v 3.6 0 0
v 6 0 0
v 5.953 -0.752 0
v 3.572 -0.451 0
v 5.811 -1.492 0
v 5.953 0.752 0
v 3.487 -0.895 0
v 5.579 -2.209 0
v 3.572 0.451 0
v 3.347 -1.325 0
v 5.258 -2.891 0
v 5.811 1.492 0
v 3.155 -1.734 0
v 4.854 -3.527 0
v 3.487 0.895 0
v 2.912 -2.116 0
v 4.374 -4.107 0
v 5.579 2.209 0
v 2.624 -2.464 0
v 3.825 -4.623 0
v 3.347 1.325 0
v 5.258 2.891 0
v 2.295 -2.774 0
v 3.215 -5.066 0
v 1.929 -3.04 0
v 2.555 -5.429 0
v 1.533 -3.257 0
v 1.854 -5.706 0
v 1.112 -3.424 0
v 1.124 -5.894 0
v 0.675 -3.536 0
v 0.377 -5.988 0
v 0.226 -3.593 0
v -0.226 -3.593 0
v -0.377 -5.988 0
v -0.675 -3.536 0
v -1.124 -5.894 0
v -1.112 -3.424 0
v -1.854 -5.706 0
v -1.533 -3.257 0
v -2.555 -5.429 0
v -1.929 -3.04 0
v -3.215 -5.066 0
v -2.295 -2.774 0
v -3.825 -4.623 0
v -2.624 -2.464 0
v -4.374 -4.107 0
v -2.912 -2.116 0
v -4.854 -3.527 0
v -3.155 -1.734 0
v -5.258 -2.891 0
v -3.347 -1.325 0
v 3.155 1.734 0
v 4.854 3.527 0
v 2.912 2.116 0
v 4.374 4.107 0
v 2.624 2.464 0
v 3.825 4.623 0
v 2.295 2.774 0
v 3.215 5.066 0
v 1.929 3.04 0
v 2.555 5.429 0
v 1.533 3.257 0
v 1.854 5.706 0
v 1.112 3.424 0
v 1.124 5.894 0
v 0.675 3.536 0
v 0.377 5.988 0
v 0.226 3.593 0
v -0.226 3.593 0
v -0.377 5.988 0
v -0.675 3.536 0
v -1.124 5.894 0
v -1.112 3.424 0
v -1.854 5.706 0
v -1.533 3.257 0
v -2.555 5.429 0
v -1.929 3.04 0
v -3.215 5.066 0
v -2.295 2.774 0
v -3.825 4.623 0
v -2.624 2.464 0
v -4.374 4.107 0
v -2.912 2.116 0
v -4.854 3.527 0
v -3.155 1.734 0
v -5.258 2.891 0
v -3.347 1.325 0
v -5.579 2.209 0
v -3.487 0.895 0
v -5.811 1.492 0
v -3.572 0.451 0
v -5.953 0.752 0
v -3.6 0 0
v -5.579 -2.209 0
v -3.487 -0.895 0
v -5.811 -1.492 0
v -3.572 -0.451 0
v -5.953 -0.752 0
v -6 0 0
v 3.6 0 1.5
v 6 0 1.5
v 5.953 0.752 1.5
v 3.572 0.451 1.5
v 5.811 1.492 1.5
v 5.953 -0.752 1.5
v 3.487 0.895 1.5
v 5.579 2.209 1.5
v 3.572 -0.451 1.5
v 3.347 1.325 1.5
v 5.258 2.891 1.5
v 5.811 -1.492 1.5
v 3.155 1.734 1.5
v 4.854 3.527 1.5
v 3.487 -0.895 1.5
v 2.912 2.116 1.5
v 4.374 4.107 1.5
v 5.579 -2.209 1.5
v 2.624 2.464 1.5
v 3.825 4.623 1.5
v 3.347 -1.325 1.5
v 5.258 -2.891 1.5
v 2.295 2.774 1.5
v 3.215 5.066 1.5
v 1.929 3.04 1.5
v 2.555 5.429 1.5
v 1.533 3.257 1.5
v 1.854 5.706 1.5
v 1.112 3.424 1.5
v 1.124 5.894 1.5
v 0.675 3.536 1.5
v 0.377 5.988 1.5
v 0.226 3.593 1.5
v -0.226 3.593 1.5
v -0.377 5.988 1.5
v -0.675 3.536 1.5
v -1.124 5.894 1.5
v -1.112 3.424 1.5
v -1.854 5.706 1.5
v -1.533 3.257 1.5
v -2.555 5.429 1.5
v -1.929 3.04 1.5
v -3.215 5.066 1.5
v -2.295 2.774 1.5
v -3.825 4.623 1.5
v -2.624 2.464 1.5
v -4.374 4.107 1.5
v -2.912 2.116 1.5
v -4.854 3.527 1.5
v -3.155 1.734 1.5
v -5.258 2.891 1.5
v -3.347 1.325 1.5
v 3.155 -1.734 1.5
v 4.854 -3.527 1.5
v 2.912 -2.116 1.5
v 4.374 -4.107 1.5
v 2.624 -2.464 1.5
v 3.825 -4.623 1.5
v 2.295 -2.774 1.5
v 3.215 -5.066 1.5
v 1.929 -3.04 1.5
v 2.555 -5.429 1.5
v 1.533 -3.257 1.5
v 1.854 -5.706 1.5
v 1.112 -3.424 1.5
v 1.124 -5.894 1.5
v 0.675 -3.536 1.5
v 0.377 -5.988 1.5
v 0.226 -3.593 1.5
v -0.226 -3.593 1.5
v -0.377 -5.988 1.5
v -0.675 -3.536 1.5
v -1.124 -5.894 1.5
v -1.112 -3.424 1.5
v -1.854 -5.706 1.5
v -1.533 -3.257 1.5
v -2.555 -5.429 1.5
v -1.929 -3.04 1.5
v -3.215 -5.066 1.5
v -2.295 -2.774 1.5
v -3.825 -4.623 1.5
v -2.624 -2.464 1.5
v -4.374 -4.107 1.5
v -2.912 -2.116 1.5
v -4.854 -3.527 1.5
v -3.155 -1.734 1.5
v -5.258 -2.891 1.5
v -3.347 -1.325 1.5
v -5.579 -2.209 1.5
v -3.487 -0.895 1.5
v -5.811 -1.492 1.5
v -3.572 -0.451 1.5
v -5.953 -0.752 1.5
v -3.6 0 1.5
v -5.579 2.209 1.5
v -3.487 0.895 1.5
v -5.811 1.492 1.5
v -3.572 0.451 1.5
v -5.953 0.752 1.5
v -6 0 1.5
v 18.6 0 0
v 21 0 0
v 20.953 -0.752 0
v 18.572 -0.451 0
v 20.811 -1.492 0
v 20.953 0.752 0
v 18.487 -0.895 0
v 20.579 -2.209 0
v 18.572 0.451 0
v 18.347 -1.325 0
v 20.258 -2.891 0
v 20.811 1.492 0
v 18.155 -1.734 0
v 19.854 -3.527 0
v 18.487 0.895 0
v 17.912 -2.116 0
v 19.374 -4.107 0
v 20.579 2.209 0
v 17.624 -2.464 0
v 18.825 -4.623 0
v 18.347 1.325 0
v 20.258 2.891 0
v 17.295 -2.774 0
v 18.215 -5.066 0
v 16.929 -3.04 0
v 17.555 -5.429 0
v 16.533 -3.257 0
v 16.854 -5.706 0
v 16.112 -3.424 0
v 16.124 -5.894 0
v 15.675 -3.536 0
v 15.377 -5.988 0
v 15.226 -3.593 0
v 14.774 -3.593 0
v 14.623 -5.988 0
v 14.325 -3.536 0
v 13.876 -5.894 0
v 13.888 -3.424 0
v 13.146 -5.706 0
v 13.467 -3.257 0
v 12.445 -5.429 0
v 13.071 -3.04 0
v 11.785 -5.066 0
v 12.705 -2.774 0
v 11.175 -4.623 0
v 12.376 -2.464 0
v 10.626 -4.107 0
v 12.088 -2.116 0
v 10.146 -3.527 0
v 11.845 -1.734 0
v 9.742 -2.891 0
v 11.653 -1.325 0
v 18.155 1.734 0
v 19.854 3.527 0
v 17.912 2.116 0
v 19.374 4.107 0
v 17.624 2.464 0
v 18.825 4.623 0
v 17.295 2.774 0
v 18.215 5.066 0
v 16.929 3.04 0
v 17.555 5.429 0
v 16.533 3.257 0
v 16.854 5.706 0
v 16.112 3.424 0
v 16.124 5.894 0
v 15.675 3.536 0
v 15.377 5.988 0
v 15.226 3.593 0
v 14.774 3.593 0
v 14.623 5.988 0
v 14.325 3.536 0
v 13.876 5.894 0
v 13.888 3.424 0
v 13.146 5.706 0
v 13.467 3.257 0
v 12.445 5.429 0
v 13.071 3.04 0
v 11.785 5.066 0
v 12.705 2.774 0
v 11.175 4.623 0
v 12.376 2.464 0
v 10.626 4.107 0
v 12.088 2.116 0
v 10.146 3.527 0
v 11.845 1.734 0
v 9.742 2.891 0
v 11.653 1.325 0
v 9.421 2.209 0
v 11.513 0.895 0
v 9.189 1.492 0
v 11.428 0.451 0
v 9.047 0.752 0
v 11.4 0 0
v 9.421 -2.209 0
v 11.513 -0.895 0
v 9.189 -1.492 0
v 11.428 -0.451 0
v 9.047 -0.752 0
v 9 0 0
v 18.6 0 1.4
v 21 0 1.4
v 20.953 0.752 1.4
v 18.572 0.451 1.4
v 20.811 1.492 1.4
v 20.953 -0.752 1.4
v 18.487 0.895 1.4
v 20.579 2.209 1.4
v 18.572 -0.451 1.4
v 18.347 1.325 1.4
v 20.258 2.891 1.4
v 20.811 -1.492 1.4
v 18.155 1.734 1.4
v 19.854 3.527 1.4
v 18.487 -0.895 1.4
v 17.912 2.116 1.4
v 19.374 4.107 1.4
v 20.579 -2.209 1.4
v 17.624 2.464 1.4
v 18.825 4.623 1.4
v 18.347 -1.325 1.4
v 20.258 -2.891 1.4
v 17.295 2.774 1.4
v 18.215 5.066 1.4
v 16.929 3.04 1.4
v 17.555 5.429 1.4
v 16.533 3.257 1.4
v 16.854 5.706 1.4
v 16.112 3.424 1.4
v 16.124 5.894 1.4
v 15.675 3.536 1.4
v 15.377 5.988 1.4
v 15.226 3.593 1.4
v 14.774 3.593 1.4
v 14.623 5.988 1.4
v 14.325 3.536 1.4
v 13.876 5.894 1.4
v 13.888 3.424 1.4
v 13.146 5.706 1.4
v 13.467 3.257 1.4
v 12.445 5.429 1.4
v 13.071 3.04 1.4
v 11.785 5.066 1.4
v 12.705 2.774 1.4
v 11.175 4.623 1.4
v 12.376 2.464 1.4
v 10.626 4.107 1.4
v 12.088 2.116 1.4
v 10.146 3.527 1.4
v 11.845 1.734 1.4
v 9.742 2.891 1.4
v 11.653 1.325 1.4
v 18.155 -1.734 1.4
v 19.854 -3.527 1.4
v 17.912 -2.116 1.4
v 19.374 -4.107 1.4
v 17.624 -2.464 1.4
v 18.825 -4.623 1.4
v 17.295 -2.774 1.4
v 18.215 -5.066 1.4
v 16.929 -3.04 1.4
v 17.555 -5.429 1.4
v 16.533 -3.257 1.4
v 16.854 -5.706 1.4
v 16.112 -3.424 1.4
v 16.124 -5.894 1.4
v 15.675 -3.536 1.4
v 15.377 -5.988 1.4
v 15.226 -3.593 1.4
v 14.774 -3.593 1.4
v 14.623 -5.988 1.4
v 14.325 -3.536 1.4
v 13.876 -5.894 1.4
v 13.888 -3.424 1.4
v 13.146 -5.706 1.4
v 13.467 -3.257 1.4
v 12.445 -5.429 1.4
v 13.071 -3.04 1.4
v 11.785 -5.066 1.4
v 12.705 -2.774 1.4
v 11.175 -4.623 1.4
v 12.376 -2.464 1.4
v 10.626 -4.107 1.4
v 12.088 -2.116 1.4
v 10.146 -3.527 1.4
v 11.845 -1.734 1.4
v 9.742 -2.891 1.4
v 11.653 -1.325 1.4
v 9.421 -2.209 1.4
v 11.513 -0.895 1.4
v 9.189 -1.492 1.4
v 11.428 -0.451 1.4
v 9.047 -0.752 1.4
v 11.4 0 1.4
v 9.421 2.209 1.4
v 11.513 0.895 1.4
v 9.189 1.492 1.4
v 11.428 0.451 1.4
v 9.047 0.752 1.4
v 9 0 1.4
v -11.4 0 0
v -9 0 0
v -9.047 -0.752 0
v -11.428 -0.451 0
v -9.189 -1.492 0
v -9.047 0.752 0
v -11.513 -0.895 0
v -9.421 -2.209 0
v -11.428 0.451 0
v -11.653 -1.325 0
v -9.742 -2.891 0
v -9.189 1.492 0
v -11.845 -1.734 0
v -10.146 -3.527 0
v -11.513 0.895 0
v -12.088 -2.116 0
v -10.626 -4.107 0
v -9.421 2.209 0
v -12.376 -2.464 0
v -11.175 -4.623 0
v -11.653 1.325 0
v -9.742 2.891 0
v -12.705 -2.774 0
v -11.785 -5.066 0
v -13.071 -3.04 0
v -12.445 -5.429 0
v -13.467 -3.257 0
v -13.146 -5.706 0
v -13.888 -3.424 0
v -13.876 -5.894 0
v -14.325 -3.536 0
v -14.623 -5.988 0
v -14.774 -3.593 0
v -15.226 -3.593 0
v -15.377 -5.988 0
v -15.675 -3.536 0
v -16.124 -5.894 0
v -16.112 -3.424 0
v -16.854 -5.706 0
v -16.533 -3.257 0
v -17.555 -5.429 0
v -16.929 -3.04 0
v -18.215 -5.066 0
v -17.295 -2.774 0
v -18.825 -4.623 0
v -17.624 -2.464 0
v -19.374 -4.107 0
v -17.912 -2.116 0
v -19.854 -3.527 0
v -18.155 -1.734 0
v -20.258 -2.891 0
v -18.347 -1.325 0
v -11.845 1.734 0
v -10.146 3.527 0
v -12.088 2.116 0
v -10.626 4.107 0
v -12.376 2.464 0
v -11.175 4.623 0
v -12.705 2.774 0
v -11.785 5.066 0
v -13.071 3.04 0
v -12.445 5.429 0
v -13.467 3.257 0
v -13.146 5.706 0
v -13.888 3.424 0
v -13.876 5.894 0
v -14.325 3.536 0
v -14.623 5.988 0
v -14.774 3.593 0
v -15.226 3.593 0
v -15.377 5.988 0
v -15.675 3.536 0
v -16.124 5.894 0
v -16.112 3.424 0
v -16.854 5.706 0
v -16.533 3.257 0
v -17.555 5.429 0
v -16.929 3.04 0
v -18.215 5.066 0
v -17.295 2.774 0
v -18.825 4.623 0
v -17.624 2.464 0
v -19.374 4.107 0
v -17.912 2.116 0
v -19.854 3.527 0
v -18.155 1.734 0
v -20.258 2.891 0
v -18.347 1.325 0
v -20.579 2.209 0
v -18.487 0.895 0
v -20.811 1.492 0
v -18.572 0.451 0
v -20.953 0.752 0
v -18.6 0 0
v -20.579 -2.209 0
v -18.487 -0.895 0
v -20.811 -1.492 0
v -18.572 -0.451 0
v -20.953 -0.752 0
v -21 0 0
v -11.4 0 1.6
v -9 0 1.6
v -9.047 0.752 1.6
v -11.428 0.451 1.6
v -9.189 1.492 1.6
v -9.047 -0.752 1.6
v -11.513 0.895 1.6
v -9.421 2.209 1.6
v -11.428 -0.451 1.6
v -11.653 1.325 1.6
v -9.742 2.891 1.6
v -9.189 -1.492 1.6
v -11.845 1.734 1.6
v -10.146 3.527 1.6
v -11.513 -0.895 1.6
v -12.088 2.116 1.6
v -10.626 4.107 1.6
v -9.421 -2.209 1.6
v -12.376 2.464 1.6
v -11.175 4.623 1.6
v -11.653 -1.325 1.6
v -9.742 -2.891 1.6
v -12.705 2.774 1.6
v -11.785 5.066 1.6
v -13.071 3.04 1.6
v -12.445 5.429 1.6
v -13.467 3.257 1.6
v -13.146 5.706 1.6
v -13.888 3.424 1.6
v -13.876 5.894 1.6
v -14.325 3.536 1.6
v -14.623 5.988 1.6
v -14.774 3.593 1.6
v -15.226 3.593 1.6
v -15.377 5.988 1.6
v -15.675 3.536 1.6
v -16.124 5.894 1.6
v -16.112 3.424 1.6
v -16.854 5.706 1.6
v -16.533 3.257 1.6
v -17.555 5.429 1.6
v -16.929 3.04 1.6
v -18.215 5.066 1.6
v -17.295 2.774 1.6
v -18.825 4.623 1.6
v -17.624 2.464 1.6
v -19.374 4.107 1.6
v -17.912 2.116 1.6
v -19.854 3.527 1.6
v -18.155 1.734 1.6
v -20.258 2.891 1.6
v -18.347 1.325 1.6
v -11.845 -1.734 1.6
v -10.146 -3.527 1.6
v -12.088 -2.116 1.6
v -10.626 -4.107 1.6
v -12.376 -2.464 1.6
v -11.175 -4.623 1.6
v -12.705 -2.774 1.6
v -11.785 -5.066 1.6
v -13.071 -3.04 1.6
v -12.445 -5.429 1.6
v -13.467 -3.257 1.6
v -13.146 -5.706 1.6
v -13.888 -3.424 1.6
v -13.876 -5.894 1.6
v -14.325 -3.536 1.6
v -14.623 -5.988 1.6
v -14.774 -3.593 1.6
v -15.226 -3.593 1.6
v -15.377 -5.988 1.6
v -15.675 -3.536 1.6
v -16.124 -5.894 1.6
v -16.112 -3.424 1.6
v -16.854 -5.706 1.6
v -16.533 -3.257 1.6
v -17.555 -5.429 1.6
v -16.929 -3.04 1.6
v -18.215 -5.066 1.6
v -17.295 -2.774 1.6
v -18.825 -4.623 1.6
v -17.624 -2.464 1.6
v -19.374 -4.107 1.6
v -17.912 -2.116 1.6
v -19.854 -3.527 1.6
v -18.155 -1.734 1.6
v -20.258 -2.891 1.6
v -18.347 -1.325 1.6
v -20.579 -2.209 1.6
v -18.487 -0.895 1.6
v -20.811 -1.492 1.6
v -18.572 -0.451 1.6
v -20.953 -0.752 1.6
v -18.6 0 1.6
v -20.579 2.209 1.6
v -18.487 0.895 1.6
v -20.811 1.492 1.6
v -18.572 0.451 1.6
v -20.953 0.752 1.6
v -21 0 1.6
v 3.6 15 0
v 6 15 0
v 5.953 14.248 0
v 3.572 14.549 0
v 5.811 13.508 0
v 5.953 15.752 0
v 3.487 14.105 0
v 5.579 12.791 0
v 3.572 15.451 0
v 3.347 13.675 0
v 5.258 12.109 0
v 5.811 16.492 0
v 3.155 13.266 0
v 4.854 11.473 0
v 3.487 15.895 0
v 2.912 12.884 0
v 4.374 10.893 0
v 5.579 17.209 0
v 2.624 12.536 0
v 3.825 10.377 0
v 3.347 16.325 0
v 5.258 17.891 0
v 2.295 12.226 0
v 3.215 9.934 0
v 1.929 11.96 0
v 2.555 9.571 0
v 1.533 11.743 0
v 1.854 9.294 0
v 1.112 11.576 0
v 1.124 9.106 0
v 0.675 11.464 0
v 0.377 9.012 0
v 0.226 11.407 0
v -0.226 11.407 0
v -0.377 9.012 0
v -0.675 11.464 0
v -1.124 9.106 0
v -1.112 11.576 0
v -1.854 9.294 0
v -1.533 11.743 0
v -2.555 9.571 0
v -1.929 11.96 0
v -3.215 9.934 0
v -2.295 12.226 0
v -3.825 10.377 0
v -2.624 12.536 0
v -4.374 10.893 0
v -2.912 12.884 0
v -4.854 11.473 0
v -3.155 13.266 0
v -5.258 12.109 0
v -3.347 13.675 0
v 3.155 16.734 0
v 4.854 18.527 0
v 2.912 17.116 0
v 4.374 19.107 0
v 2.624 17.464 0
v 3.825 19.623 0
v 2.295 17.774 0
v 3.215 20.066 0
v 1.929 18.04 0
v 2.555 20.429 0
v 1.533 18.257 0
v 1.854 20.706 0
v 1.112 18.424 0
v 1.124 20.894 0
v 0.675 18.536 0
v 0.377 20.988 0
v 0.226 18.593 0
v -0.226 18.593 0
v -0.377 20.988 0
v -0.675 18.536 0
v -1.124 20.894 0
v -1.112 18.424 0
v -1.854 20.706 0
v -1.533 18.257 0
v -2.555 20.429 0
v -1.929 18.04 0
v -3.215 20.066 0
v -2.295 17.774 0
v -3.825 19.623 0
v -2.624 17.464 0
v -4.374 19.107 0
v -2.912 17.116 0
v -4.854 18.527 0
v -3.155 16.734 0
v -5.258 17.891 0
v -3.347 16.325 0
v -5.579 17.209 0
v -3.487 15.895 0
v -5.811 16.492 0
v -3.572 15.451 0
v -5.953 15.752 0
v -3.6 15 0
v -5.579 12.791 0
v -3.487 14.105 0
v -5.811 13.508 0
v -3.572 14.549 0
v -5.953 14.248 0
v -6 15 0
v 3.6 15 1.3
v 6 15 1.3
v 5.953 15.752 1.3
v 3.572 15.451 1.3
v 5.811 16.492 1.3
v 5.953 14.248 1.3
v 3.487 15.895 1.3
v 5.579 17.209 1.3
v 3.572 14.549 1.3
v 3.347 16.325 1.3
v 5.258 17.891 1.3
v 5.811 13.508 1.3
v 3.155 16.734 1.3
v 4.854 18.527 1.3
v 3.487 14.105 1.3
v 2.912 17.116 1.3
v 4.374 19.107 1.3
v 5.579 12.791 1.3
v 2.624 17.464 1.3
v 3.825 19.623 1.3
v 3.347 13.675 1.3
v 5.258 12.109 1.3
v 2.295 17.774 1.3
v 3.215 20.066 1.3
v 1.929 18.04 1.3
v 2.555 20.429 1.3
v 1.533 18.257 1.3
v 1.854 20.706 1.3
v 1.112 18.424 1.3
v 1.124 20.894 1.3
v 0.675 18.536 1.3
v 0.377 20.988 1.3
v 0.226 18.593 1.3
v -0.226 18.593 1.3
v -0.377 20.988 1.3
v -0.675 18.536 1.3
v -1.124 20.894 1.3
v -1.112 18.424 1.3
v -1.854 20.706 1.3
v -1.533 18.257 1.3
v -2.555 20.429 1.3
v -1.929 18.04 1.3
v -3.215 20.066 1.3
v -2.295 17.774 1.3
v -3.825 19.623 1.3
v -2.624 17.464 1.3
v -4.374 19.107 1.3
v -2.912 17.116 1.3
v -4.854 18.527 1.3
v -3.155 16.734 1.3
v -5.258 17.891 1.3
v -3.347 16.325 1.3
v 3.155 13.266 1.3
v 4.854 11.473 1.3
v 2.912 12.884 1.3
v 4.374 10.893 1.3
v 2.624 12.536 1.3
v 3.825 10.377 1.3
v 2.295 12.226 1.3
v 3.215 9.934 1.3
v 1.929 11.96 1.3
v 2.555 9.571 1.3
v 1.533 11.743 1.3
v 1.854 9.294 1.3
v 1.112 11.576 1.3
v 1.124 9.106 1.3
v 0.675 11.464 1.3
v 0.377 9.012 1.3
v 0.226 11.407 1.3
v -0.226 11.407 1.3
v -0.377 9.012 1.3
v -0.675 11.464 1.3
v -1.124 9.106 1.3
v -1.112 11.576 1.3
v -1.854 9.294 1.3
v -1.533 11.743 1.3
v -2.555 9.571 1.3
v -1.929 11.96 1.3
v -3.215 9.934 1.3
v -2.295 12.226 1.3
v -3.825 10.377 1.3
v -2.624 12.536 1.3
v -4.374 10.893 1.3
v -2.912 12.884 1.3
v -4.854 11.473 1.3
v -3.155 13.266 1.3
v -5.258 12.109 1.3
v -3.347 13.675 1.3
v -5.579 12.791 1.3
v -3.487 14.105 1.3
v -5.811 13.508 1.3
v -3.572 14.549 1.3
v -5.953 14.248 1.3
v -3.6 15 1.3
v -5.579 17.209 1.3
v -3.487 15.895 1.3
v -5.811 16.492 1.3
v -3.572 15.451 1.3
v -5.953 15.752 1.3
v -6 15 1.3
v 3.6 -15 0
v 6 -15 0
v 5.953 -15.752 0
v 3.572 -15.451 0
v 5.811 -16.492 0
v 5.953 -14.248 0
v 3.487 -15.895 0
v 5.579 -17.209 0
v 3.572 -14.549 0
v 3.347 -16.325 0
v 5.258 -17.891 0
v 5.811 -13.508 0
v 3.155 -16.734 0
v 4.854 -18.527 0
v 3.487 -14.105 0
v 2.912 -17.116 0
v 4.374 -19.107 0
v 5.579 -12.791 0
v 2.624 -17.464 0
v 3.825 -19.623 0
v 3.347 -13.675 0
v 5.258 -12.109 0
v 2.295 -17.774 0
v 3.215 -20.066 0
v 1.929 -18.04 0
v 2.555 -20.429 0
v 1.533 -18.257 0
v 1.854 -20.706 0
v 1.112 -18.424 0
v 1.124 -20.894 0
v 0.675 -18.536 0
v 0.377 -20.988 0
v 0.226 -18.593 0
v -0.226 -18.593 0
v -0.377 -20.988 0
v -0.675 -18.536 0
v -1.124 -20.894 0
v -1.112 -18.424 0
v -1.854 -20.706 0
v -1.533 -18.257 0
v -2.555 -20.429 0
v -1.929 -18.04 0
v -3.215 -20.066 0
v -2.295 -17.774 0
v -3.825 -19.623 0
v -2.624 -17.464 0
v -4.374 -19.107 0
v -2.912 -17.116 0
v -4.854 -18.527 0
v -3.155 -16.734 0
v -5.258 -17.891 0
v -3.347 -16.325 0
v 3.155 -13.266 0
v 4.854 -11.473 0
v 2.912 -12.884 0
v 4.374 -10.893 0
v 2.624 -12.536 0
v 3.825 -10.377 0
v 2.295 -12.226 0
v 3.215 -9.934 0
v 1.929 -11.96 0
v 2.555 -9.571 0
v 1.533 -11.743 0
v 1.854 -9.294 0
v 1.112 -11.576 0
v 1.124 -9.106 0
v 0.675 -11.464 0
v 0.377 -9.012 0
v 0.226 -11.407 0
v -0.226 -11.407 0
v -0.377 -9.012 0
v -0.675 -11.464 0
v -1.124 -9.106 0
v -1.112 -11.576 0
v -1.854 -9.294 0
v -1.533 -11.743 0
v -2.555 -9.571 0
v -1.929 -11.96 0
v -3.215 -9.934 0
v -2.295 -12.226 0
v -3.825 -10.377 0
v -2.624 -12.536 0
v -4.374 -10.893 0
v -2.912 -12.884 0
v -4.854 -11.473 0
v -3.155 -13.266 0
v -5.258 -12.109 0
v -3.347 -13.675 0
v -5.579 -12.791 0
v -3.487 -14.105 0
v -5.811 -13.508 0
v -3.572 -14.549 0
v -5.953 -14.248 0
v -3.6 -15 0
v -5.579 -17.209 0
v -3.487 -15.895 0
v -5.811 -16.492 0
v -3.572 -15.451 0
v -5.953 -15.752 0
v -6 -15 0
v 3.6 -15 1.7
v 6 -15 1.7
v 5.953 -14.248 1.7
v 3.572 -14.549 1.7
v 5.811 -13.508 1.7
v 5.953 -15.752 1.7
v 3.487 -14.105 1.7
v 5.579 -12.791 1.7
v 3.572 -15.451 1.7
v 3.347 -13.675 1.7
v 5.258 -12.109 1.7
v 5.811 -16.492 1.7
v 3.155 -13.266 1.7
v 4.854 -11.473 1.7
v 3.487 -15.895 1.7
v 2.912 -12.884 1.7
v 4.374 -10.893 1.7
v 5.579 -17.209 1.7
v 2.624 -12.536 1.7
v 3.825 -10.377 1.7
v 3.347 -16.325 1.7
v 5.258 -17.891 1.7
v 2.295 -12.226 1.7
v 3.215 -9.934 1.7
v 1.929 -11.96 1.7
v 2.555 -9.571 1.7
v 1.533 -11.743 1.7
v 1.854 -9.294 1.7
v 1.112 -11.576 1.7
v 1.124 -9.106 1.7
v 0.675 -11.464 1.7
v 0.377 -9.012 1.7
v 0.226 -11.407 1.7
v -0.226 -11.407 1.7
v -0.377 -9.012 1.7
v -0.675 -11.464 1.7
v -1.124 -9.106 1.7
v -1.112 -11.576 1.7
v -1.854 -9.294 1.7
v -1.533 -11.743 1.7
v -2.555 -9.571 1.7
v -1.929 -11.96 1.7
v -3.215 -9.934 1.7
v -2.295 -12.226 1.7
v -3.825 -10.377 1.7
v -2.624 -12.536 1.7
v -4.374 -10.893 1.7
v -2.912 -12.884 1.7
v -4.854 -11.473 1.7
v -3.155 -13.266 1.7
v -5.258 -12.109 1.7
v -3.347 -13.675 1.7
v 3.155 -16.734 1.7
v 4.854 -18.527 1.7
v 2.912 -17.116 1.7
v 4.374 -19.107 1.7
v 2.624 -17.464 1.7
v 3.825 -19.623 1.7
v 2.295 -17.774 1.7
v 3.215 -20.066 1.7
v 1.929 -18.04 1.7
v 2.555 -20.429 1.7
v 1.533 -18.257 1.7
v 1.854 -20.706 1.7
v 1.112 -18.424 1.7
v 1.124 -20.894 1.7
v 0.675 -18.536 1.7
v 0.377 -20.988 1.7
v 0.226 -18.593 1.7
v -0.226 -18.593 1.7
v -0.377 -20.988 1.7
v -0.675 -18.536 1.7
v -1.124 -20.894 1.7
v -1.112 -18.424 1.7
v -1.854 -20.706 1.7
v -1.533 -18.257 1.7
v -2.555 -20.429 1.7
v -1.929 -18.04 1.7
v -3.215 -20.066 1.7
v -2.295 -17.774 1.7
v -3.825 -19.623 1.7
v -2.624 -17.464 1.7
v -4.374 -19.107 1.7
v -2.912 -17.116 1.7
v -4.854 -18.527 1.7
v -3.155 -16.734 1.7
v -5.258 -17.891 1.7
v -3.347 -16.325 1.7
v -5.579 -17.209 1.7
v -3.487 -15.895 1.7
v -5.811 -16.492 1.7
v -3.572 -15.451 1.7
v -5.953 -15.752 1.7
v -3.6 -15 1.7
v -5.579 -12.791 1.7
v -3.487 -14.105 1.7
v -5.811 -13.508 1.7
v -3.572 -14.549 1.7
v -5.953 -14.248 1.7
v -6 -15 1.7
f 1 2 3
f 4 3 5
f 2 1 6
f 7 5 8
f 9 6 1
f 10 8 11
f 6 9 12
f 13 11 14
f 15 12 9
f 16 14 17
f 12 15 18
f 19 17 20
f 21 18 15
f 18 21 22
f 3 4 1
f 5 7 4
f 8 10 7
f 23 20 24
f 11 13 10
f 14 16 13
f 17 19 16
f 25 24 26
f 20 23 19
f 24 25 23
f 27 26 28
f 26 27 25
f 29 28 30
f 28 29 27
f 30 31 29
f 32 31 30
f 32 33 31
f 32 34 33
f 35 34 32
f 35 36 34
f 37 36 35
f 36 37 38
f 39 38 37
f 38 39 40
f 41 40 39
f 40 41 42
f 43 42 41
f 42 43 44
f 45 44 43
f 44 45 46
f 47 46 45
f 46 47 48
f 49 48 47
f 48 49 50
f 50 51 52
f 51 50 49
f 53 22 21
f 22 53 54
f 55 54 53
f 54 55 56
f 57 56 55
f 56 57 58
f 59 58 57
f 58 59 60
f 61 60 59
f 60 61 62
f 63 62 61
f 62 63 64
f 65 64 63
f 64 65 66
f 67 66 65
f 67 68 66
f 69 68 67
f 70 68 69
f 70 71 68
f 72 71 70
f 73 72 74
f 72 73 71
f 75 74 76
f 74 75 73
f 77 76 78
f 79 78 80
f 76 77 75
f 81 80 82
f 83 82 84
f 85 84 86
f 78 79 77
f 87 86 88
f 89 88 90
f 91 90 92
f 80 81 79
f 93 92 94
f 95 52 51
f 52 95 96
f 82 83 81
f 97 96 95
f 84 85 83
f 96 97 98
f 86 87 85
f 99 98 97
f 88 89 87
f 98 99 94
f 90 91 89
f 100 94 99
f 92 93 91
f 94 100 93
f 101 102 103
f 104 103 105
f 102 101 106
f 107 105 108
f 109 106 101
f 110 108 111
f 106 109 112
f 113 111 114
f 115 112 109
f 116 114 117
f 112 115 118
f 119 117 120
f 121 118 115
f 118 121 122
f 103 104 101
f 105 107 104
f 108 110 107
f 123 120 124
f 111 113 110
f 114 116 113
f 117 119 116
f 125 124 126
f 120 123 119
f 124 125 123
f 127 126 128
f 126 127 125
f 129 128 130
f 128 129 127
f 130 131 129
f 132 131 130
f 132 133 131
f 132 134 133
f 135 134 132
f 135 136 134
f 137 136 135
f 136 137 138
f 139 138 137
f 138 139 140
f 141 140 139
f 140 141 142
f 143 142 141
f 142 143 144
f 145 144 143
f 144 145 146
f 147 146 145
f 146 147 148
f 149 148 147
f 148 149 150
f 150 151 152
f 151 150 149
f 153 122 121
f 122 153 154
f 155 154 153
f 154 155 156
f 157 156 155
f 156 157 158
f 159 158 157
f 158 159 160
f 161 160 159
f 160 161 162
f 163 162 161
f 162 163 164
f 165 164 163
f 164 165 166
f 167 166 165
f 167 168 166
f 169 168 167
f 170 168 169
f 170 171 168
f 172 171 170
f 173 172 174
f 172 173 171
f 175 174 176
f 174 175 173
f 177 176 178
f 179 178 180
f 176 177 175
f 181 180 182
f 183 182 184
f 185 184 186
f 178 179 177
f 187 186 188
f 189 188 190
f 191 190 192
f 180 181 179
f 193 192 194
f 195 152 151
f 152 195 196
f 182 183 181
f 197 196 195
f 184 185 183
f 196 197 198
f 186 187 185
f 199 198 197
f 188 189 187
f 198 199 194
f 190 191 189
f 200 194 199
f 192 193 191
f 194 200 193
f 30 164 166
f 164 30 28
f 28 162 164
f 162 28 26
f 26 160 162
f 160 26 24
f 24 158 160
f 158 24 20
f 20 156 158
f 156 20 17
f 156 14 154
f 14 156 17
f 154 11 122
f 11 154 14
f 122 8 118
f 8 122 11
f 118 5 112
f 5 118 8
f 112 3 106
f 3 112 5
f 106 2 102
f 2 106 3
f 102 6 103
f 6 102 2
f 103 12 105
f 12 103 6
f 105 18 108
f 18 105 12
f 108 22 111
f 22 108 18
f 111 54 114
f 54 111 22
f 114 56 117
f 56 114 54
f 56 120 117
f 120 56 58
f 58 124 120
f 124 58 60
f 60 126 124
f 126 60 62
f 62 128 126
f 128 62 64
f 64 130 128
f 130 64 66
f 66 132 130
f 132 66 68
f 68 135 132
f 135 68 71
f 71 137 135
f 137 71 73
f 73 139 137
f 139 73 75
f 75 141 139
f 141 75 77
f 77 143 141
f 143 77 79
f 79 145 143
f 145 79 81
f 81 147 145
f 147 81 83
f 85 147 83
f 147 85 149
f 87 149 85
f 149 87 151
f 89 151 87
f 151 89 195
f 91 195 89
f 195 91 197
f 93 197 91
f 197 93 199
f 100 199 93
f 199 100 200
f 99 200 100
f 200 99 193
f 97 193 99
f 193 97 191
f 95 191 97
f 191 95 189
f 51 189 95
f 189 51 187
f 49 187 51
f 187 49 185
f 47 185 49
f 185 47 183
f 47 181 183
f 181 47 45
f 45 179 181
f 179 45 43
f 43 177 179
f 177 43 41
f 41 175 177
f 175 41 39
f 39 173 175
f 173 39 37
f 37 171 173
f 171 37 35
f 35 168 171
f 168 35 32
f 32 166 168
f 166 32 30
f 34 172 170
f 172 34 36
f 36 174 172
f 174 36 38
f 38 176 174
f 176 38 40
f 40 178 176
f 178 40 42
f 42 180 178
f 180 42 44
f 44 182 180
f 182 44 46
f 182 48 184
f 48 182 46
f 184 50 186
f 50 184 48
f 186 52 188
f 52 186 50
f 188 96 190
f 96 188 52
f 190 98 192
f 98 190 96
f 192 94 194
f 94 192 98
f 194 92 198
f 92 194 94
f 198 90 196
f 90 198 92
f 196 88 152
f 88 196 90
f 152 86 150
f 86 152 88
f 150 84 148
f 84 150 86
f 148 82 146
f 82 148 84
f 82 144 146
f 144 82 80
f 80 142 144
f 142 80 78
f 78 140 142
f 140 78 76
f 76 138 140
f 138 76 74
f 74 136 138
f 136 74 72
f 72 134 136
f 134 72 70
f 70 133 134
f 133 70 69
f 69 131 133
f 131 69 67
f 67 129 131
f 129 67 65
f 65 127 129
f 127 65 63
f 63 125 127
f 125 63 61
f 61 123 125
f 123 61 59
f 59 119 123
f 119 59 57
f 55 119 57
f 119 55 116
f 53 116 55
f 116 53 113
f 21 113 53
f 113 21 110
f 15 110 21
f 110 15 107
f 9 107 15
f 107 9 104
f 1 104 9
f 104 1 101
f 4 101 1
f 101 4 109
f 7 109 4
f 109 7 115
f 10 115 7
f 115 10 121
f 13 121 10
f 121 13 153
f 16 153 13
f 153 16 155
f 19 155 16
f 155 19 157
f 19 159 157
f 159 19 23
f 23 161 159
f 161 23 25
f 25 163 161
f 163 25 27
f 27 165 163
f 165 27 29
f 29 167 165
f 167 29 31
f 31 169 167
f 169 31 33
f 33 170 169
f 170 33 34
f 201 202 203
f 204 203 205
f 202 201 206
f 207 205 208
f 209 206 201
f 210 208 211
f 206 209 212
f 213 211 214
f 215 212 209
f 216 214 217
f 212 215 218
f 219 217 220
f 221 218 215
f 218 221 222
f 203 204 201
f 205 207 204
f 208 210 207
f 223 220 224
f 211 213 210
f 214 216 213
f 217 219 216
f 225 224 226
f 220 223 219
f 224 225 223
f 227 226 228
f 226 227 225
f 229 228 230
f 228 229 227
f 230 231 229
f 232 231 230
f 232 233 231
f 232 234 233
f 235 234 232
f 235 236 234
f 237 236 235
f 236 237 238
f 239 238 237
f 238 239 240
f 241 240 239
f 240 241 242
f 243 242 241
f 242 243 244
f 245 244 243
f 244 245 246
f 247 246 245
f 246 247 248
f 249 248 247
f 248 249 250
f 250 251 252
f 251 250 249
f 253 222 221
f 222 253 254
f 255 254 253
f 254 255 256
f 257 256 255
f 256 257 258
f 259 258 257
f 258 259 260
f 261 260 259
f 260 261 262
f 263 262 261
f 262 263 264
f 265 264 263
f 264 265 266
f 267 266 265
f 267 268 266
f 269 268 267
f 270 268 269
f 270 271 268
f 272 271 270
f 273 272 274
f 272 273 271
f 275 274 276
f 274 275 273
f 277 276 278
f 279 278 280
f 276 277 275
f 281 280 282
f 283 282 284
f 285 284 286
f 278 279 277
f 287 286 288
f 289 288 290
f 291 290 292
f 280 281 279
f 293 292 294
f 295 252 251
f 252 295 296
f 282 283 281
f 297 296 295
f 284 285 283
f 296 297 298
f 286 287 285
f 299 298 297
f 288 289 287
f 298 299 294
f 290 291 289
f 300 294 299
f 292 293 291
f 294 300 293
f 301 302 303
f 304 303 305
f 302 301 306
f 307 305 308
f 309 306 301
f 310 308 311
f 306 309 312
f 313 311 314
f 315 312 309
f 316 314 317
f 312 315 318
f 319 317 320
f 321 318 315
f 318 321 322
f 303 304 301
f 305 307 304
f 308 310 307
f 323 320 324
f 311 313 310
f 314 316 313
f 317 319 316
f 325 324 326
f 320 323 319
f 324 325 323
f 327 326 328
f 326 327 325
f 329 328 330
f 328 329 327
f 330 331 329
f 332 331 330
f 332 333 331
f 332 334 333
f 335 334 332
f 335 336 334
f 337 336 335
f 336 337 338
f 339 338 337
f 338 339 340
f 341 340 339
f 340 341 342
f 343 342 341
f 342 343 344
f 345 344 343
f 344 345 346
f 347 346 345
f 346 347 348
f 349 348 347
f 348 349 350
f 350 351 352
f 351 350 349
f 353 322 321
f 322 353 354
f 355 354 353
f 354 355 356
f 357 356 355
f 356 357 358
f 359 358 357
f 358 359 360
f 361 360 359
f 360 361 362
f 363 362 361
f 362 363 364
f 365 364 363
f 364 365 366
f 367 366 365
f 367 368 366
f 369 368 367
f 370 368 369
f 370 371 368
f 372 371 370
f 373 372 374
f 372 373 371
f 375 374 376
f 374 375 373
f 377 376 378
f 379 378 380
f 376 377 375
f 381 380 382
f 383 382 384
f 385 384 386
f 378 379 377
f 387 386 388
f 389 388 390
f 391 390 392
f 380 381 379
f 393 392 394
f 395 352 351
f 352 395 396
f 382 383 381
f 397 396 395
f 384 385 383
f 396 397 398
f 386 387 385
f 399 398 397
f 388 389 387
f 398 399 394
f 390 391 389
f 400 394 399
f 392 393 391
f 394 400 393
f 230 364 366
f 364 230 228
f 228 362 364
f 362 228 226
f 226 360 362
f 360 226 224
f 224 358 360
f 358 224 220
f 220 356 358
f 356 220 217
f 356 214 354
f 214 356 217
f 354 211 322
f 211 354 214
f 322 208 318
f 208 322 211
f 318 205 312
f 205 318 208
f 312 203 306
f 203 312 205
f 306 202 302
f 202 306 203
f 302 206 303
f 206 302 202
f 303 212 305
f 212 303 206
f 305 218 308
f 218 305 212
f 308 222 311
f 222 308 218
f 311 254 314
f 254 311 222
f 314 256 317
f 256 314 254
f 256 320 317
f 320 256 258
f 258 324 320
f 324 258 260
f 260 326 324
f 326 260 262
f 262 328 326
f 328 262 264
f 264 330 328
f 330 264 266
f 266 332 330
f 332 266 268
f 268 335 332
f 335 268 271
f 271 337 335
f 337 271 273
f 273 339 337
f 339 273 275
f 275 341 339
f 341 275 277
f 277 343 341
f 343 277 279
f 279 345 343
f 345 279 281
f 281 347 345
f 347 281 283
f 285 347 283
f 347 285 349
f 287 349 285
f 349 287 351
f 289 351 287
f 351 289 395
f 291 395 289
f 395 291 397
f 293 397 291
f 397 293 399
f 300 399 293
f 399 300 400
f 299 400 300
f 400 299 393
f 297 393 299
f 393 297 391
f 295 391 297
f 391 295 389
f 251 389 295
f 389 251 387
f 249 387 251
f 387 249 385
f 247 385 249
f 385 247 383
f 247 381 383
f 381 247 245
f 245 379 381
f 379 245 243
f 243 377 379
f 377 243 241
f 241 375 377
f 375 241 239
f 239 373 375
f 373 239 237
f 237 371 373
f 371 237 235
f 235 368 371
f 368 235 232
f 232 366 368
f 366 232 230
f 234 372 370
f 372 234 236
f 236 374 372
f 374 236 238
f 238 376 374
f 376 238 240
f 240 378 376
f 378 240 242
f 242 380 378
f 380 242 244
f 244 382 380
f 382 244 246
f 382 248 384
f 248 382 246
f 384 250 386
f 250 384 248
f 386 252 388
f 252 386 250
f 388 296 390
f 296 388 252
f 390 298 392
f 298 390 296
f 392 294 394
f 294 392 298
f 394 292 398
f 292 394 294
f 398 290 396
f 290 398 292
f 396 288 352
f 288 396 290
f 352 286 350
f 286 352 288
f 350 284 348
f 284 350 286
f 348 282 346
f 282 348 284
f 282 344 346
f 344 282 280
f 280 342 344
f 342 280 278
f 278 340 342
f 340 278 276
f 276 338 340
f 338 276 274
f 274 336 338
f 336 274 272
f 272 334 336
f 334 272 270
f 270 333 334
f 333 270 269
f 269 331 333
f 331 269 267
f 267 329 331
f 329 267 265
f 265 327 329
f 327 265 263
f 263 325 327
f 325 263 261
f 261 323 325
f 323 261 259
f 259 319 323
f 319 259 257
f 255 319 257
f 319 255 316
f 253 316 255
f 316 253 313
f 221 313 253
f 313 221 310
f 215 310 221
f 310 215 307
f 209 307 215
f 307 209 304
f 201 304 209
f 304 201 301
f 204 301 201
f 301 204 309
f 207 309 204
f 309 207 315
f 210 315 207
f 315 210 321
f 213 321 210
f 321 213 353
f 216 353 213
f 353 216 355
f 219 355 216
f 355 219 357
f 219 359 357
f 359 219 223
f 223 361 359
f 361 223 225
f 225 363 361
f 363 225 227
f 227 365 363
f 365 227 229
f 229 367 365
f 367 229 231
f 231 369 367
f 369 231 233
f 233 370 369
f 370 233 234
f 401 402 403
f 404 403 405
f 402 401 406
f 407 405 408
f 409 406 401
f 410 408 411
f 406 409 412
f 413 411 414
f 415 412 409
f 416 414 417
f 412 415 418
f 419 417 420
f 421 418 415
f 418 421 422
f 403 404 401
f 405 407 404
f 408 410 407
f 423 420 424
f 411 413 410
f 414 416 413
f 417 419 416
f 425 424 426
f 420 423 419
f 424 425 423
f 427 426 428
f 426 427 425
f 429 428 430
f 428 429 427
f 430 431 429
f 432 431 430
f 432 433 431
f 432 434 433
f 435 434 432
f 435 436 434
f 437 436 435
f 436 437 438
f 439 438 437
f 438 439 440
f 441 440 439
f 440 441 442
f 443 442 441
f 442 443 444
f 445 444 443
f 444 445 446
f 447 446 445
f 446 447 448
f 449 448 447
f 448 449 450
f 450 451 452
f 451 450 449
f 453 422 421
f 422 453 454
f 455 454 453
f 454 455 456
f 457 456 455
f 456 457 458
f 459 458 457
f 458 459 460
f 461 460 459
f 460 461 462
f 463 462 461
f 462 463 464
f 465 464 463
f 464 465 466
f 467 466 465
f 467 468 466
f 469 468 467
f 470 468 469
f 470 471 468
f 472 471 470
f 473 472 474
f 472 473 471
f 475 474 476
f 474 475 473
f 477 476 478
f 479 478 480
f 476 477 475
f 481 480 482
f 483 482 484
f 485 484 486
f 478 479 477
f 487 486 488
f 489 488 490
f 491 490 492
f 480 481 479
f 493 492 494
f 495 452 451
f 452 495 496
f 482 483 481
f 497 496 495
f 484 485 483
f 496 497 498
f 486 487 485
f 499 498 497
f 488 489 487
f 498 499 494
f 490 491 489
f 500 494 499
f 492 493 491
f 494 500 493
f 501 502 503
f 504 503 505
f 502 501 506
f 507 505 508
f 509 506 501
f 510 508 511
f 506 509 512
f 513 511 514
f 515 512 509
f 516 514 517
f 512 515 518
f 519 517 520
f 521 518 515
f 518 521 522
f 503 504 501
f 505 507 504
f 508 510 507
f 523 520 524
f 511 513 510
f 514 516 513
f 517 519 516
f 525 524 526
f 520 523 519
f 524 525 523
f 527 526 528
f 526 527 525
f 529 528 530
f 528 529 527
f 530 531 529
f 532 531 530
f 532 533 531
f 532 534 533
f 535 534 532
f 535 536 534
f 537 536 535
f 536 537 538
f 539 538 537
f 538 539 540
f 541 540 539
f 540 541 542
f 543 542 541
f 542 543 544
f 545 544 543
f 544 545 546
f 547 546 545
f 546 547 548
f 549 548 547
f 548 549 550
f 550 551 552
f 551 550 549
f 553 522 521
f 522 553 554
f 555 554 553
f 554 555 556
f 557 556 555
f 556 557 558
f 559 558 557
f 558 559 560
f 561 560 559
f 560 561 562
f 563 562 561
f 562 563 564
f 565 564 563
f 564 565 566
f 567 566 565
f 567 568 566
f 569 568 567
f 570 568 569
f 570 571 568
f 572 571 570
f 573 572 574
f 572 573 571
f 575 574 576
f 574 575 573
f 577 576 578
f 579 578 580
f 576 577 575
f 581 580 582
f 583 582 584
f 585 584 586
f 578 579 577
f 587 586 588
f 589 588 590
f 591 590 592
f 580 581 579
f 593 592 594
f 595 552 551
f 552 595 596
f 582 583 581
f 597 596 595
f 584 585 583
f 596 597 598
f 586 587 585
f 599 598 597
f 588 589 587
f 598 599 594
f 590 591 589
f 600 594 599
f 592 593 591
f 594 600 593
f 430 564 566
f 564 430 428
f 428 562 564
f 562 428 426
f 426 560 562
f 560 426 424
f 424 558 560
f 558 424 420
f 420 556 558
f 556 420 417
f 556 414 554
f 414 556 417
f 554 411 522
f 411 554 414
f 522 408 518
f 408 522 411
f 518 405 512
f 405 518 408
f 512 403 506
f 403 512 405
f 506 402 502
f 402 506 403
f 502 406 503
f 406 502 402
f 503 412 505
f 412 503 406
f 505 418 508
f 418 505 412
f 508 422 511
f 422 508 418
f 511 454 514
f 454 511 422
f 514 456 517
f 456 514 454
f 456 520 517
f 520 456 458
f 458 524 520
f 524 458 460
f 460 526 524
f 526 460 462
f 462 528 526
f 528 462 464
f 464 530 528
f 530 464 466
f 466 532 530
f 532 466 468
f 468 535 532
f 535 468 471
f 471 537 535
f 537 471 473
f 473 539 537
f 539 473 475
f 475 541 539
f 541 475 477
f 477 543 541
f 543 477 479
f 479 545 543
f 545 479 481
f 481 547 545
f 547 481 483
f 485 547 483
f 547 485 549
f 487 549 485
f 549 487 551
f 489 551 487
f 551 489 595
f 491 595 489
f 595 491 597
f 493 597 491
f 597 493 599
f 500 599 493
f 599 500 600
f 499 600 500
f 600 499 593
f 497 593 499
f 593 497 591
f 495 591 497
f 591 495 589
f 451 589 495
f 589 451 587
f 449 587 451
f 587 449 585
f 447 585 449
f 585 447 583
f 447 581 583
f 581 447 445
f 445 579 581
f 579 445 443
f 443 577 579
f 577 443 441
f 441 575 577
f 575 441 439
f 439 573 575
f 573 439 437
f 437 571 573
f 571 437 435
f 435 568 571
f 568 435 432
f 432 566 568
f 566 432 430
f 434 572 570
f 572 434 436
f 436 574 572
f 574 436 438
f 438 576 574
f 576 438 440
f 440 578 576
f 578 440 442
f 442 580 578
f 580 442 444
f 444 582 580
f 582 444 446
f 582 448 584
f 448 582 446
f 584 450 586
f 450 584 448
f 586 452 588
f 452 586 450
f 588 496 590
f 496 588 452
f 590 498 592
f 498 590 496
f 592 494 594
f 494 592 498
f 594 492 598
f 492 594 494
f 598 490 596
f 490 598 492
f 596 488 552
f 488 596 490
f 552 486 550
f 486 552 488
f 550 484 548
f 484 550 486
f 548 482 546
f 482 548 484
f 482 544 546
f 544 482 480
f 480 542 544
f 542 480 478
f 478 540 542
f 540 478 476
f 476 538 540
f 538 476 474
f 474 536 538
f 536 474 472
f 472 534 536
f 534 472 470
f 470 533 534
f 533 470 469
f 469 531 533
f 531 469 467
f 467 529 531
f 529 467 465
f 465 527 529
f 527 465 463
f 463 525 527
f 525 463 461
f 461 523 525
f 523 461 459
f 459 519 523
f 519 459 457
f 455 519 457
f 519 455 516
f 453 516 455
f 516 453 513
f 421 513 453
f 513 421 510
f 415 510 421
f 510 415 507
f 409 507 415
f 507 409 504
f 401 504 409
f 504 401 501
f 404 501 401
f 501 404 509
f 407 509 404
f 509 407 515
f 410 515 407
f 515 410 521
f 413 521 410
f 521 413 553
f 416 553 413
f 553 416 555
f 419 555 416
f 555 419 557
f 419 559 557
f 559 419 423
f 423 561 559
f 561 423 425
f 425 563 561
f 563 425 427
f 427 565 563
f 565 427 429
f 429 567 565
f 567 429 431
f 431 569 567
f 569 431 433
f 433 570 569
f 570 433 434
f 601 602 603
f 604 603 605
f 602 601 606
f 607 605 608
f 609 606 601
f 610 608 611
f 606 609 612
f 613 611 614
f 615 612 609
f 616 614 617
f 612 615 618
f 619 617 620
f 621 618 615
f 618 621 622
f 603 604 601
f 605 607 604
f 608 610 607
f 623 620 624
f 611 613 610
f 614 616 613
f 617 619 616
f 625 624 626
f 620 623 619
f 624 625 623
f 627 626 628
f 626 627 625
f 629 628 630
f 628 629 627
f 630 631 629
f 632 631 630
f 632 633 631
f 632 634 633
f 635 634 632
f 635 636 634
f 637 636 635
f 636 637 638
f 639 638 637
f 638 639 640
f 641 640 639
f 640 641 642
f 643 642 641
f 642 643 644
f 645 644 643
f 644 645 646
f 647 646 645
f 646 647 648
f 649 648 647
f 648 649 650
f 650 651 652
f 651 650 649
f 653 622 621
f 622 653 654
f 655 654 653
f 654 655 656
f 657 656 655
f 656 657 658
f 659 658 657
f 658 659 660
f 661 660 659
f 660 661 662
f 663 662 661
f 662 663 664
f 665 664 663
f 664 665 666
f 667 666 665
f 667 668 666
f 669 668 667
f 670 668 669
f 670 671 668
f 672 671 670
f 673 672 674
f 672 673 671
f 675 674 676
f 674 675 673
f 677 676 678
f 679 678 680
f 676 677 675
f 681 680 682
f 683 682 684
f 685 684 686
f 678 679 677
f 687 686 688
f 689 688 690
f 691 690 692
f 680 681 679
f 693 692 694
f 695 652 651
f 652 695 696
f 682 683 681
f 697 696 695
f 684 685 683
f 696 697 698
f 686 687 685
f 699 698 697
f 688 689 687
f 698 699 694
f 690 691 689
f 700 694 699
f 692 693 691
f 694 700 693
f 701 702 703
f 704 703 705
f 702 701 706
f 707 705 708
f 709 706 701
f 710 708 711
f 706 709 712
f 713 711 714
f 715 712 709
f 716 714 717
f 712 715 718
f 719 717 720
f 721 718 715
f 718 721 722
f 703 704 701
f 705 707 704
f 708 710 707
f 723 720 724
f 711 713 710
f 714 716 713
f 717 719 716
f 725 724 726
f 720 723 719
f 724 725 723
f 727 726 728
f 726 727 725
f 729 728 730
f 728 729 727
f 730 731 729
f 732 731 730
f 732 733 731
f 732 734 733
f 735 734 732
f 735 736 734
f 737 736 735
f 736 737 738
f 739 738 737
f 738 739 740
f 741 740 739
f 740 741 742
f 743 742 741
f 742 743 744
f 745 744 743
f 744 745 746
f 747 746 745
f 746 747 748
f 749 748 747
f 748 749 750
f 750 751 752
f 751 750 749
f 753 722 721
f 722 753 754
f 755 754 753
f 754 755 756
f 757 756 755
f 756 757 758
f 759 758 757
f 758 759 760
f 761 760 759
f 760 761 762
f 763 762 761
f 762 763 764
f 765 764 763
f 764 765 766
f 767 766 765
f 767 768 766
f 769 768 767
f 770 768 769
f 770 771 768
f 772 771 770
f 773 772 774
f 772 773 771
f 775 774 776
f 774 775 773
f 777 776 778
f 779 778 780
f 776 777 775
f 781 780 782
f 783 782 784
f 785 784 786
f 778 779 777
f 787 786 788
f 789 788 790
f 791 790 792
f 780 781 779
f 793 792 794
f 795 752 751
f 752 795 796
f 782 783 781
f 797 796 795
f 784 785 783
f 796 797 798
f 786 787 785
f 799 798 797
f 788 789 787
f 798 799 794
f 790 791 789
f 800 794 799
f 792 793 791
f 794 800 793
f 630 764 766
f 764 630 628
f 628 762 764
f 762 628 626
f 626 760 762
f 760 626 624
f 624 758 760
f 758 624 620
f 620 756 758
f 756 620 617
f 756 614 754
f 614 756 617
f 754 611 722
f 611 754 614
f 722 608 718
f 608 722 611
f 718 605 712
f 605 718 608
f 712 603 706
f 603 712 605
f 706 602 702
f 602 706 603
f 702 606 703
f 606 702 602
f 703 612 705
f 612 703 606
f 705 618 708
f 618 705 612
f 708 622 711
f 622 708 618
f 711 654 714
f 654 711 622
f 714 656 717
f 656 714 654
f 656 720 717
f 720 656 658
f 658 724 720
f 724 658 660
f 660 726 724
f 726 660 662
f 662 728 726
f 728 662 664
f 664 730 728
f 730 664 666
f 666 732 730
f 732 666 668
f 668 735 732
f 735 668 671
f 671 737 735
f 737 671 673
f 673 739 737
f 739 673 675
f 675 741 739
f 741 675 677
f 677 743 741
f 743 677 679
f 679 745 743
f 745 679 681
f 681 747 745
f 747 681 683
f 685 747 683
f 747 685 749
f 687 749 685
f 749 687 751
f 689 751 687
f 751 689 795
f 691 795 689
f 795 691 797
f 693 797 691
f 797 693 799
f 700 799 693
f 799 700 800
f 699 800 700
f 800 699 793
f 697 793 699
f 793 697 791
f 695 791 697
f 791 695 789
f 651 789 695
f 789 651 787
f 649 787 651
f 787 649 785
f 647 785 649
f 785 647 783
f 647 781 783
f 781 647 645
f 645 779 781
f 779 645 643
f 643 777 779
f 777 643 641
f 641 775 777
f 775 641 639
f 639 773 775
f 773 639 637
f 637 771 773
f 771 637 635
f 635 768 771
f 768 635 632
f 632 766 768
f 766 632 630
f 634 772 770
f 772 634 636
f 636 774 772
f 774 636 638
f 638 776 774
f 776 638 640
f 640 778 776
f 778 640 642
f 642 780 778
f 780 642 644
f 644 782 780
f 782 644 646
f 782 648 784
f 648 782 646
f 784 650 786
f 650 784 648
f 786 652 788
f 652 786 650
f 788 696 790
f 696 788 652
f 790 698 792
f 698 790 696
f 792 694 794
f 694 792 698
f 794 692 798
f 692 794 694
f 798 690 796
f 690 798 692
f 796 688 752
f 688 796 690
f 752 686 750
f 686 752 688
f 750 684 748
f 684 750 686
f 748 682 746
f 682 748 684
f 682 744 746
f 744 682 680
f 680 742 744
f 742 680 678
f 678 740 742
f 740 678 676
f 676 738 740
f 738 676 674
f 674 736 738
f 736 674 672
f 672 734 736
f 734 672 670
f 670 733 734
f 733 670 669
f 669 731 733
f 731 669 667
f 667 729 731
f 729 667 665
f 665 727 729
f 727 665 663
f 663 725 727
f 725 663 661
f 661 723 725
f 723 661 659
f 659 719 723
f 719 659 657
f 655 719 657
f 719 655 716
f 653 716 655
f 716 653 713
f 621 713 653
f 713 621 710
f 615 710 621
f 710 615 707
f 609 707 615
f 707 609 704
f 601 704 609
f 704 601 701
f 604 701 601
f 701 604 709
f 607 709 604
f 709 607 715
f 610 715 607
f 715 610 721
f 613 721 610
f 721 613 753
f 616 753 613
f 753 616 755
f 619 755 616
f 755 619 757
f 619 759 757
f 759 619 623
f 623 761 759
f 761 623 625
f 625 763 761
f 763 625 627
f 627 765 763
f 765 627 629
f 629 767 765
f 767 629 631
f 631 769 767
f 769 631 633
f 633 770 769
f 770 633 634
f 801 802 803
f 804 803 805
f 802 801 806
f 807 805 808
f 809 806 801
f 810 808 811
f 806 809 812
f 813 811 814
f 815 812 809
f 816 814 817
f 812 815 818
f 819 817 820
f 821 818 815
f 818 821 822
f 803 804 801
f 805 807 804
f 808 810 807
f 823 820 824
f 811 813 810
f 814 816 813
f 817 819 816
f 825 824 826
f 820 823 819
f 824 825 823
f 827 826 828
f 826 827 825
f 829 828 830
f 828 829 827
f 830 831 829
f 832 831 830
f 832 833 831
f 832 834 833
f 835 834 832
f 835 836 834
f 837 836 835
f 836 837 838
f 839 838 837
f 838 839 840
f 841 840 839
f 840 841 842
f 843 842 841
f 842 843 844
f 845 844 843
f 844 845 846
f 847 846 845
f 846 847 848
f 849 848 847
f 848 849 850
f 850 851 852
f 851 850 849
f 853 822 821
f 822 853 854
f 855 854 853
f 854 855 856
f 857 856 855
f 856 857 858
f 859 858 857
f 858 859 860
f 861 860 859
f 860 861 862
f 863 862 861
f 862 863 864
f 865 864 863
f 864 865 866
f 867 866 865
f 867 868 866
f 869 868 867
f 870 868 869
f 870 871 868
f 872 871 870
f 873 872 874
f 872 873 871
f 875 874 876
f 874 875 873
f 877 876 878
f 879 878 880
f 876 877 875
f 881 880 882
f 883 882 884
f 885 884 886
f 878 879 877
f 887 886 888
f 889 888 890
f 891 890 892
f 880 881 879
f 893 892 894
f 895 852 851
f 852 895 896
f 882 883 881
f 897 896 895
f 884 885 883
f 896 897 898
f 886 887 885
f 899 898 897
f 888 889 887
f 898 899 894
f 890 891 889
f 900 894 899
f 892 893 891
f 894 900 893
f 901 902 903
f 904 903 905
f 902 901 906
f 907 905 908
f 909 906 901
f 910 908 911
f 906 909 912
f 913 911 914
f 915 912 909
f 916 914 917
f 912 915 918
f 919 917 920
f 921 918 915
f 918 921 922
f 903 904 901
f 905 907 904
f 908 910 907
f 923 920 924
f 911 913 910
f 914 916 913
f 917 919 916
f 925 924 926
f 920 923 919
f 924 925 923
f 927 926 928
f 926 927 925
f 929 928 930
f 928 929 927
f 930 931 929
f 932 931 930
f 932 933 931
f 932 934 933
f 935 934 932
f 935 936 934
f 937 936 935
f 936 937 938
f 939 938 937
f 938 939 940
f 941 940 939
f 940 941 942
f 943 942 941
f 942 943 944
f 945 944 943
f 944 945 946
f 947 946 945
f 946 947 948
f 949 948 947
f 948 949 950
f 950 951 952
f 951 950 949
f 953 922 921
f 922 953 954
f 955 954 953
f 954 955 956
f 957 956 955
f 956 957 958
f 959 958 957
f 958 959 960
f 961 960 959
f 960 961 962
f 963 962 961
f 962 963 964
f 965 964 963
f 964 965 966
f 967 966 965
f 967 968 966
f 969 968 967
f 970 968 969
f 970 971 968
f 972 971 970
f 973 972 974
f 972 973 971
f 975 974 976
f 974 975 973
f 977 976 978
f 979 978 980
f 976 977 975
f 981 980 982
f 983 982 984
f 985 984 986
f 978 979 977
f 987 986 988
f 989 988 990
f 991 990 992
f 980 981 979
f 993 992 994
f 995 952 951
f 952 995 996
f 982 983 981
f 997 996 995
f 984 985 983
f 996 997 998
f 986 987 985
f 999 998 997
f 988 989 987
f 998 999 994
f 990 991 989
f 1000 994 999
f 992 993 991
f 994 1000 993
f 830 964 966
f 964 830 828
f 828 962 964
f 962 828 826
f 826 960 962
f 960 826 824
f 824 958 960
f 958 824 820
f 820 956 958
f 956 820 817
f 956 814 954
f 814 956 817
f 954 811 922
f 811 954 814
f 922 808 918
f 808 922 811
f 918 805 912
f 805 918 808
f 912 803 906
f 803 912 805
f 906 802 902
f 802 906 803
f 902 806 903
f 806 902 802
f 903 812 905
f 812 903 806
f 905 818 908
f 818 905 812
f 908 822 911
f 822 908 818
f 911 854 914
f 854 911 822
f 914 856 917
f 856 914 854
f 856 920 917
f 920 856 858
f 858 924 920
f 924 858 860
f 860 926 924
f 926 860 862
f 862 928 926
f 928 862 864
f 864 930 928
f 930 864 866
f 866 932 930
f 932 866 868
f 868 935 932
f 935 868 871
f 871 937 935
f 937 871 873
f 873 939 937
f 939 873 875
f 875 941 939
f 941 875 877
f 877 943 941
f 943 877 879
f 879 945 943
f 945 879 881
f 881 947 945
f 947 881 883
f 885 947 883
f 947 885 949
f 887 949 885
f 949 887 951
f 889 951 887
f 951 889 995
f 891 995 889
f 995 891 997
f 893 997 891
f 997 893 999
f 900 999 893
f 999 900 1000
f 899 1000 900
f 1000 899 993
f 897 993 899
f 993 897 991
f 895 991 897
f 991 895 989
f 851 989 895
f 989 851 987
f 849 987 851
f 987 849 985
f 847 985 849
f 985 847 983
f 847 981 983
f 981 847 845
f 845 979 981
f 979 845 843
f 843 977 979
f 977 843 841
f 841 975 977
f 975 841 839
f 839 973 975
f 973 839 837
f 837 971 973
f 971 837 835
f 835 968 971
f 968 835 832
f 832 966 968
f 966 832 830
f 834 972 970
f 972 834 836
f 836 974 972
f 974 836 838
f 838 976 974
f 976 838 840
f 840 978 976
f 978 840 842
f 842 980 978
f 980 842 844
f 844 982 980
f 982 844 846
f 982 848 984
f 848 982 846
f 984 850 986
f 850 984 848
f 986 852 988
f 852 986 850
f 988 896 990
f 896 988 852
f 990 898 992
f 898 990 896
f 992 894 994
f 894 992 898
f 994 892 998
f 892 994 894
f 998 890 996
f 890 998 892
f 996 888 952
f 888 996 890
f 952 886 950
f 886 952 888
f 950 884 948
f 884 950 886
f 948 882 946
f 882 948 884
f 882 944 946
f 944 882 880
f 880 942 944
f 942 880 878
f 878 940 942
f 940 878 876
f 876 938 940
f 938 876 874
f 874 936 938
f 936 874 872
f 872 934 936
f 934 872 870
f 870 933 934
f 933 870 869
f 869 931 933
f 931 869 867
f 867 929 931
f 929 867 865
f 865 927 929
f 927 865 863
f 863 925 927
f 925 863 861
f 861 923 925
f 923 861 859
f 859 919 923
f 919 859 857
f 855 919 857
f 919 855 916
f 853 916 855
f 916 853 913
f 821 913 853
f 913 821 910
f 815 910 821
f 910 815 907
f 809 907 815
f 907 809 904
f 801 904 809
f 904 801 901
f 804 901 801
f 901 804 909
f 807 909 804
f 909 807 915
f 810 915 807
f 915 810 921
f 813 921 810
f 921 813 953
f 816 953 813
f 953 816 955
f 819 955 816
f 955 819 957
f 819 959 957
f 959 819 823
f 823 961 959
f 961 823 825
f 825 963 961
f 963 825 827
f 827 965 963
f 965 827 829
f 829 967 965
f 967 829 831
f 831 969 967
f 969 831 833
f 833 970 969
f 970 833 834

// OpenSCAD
$fn=50;
shaiba(1.5);
translate([15,0,0])shaiba(1.4);
translate([-15,0,0])shaiba(1.6);
translate([0,15,0])shaiba(1.3);
translate([0,-15,0])shaiba(1.7);


module shaiba(hght){
    linear_extrude(hght)difference(){
        circle(d=12);
        circle(d=7.2);
    }
}
